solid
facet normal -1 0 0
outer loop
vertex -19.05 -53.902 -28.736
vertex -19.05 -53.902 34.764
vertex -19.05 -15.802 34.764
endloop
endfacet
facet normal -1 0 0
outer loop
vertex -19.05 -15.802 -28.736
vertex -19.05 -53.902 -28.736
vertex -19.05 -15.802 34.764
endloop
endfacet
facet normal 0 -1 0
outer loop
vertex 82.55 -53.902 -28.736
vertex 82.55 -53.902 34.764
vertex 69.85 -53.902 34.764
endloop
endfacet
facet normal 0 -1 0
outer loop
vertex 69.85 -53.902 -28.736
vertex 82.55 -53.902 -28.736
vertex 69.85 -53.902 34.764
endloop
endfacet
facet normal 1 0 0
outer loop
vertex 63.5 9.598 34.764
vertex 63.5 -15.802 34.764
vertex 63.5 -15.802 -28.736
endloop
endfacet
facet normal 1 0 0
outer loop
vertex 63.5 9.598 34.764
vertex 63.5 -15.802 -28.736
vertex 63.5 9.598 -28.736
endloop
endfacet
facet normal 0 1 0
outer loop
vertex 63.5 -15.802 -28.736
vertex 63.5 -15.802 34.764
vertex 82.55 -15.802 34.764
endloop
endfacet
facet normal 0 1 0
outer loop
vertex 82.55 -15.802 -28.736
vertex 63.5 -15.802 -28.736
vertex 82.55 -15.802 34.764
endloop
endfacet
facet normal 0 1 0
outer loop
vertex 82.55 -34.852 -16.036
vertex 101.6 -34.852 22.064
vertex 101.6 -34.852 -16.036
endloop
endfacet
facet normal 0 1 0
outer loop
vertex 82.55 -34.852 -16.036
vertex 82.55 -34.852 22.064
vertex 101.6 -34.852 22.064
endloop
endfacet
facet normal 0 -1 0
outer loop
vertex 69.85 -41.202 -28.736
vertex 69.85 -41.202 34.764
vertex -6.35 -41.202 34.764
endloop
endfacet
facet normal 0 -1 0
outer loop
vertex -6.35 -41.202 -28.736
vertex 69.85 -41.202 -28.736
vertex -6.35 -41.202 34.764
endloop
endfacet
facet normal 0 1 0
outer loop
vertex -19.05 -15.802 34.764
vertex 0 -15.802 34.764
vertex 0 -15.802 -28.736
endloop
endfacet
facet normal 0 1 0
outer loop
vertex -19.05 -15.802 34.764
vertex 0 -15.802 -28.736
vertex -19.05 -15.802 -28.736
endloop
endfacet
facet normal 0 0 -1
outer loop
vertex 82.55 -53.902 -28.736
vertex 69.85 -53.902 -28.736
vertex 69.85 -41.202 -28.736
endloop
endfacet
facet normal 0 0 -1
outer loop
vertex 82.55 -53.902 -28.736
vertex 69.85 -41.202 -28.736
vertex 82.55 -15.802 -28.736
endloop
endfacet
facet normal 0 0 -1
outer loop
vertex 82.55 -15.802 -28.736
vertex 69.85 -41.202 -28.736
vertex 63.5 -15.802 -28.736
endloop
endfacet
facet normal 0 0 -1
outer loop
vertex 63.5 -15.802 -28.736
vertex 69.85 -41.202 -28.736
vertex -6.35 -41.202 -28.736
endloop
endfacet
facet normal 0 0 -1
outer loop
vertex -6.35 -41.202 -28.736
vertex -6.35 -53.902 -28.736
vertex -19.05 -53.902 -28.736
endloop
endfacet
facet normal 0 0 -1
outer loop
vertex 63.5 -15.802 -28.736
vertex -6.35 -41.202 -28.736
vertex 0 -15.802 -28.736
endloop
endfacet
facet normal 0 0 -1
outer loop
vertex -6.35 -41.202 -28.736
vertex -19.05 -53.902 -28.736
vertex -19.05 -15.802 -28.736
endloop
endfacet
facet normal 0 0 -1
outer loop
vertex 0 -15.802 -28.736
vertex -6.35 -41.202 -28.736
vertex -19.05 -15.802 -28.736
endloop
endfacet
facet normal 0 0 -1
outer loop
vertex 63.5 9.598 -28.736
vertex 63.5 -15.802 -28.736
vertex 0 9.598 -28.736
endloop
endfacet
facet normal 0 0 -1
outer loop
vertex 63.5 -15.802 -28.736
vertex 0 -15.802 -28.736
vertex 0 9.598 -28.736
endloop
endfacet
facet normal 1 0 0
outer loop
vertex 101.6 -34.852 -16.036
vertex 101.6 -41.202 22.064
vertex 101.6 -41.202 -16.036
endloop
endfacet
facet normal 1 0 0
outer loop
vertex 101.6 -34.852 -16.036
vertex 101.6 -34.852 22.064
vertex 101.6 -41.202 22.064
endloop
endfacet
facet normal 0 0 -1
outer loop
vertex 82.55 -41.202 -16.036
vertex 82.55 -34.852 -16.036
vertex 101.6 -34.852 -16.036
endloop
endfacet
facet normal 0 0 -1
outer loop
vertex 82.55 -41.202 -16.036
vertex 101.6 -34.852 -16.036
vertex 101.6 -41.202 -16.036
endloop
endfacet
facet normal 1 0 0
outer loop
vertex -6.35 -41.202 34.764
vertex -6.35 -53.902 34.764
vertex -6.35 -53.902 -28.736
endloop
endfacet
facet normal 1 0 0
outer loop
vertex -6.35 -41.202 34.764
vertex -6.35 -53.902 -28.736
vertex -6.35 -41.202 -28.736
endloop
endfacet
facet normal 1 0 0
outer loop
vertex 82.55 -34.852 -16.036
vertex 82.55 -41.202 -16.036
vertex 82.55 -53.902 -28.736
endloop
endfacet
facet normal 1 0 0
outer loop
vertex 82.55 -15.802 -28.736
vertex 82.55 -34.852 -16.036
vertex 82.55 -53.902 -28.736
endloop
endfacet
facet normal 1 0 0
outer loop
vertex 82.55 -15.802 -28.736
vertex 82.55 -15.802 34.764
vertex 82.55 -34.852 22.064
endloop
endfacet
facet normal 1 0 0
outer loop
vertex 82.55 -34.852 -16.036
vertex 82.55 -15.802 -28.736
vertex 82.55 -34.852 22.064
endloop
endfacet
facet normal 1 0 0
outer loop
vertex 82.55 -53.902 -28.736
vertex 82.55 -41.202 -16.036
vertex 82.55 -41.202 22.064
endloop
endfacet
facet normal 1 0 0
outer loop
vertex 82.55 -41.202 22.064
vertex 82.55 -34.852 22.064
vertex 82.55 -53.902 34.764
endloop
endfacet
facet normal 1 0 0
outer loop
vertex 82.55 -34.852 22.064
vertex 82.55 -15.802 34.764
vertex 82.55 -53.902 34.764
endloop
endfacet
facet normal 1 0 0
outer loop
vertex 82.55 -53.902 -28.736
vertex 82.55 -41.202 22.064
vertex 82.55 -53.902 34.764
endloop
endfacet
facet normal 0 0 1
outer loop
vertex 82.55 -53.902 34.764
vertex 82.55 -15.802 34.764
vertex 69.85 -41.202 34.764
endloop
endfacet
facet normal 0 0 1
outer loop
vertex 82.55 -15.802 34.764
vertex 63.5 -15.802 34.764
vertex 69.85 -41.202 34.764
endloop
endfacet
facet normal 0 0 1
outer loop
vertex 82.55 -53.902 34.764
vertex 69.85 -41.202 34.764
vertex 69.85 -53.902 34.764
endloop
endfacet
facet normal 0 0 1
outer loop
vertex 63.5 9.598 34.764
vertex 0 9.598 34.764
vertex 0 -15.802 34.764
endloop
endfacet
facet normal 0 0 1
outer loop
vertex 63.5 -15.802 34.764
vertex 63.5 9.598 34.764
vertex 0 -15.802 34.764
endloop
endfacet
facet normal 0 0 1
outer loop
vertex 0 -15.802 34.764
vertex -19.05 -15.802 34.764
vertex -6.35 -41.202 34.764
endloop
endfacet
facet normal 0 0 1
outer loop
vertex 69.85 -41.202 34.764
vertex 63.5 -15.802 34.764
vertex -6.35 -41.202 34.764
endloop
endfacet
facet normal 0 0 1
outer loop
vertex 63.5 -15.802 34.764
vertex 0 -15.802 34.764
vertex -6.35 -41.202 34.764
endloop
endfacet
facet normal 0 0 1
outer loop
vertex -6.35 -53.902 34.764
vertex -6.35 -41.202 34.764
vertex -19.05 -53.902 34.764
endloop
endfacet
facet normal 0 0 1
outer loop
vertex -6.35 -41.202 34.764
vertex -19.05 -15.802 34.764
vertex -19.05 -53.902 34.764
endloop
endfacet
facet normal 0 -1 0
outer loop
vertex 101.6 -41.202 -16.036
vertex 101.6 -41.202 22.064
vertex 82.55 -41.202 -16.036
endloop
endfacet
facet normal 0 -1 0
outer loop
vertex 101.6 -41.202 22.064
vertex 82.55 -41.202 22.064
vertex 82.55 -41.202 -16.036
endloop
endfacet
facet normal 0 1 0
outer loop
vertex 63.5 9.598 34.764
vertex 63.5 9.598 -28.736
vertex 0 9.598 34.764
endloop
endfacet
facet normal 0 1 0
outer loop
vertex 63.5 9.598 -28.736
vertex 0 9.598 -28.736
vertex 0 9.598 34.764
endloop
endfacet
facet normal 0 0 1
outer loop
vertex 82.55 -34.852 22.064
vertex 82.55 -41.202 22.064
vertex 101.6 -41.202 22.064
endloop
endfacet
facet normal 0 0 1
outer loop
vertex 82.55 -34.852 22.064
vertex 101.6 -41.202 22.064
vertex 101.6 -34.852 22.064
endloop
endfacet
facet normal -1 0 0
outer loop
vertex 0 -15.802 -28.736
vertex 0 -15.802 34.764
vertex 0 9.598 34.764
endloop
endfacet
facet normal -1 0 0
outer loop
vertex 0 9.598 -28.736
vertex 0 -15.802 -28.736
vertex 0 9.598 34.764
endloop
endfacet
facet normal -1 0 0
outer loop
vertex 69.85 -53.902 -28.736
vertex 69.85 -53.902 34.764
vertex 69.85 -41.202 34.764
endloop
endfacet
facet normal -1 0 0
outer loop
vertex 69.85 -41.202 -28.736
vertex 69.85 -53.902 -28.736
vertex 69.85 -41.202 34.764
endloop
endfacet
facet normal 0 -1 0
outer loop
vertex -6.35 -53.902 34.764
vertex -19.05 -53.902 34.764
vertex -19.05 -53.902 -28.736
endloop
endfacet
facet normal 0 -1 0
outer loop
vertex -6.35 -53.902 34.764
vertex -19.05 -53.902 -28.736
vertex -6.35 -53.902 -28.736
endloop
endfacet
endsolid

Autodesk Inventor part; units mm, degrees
ref_plane "YZ Plane" through (0, 0, 0) normal (1, 0, 0) x (0, 1, 0)
ref_plane "XZ Plane" through (0, 0, 0) normal (0, 1, 0) x (-1, 0, 0)
ref_plane "XY Plane" through (0, 0, 0) normal (0, 0, 1) x (1, 0, 0)
sketch "Sketch1" plane through (0, 0, 0) normal (1, 0, 0) x (0, 1, 0)
  line L0 (9.5985, 34.7638) -> (-15.8015, 34.7638)
  line L1 (-15.8015, 34.7638) -> (-15.8015, -28.7362)
  line L2 (-15.8015, -28.7362) -> (9.5985, -28.7362)
  line L3 (9.5985, -28.7362) -> (9.5985, 34.7638)
  point P0 (0, 0)
  dimension "d0" = 25.4
  dimension "d1" = 63.5
extrude "Extrusion1" add sketch "Sketch1" along normal blind 63.5
sketch "Sketch2" plane through (0, -15.8015, 34.7638) normal (0, 0, 1) x (1, 0, 0)
  line L0 (0, 0) -> (63.5, 0) projected
  line L1 (31.75, 0) -> (-19.05, 0)
  line L2 (-19.05, 0) -> (82.55, 0)
  line L3 (82.55, 0) -> (82.55, -25.4)
  line L4 (82.55, -25.4) -> (-19.05, -25.4)
  line L5 (-19.05, -25.4) -> (-19.05, 0)
  point P0 (0, 15.8015)
  dimension "d4" = 50.8
  dimension "d5" = 101.6
  dimension "d6" = 25.4
extrude "Extrusion2" add sketch "Sketch2" against normal blind 63.5
sketch "Sketch3" plane through (0, 9.5985, 34.7638) normal (0, 0, 1) x (1, 0, 0)
  line L0 (82.55, -50.8) -> (-19.05, -50.8) projected
  line L1 (-19.05, -50.8) -> (-19.05, -63.5)
  line L2 (-19.05, -63.5) -> (-6.35, -63.5)
  line L3 (-6.35, -63.5) -> (-6.35, -50.8)
  line L4 (82.55, -50.8) -> (82.55, -63.5)
  line L5 (82.55, -63.5) -> (69.85, -63.5)
  line L6 (69.85, -63.5) -> (69.85, -50.8)
  point P0 (0, -9.5985)
  dimension "d9" = 12.7
  dimension "d10" = 12.7
  dimension "d11" = 12.7
  dimension "d12" = 12.7
extrude "Extrusion3" add sketch "Sketch3" against normal blind 63.5
sketch "Sketch4" plane through (82.55, -15.8015, 34.7638) normal (1, 0, 0) x (0, 0, -1)
  line L0 (0, 0) -> (63.5, 0) projected
  line L1 (31.75, -19.05) -> (12.7, -19.05)
  line L2 (12.7, -19.05) -> (50.8, -19.05)
  line L3 (50.8, -19.05) -> (50.8, -25.4)
  line L4 (0, -25.4) -> (63.5, -25.4) projected
  line L5 (50.8, -25.4) -> (12.7, -25.4)
  line L6 (12.7, -25.4) -> (12.7, -19.05)
  point P0 (34.7638, 15.8015)
  dimension "d16" = 19.05
  dimension "d17" = 38.1
  dimension "d18" = 6.35
  dimension "d19" = 38.1
  dimension "d20" = 6.35
extrude "Extrusion4" add sketch "Sketch4" along normal blind 19.05
